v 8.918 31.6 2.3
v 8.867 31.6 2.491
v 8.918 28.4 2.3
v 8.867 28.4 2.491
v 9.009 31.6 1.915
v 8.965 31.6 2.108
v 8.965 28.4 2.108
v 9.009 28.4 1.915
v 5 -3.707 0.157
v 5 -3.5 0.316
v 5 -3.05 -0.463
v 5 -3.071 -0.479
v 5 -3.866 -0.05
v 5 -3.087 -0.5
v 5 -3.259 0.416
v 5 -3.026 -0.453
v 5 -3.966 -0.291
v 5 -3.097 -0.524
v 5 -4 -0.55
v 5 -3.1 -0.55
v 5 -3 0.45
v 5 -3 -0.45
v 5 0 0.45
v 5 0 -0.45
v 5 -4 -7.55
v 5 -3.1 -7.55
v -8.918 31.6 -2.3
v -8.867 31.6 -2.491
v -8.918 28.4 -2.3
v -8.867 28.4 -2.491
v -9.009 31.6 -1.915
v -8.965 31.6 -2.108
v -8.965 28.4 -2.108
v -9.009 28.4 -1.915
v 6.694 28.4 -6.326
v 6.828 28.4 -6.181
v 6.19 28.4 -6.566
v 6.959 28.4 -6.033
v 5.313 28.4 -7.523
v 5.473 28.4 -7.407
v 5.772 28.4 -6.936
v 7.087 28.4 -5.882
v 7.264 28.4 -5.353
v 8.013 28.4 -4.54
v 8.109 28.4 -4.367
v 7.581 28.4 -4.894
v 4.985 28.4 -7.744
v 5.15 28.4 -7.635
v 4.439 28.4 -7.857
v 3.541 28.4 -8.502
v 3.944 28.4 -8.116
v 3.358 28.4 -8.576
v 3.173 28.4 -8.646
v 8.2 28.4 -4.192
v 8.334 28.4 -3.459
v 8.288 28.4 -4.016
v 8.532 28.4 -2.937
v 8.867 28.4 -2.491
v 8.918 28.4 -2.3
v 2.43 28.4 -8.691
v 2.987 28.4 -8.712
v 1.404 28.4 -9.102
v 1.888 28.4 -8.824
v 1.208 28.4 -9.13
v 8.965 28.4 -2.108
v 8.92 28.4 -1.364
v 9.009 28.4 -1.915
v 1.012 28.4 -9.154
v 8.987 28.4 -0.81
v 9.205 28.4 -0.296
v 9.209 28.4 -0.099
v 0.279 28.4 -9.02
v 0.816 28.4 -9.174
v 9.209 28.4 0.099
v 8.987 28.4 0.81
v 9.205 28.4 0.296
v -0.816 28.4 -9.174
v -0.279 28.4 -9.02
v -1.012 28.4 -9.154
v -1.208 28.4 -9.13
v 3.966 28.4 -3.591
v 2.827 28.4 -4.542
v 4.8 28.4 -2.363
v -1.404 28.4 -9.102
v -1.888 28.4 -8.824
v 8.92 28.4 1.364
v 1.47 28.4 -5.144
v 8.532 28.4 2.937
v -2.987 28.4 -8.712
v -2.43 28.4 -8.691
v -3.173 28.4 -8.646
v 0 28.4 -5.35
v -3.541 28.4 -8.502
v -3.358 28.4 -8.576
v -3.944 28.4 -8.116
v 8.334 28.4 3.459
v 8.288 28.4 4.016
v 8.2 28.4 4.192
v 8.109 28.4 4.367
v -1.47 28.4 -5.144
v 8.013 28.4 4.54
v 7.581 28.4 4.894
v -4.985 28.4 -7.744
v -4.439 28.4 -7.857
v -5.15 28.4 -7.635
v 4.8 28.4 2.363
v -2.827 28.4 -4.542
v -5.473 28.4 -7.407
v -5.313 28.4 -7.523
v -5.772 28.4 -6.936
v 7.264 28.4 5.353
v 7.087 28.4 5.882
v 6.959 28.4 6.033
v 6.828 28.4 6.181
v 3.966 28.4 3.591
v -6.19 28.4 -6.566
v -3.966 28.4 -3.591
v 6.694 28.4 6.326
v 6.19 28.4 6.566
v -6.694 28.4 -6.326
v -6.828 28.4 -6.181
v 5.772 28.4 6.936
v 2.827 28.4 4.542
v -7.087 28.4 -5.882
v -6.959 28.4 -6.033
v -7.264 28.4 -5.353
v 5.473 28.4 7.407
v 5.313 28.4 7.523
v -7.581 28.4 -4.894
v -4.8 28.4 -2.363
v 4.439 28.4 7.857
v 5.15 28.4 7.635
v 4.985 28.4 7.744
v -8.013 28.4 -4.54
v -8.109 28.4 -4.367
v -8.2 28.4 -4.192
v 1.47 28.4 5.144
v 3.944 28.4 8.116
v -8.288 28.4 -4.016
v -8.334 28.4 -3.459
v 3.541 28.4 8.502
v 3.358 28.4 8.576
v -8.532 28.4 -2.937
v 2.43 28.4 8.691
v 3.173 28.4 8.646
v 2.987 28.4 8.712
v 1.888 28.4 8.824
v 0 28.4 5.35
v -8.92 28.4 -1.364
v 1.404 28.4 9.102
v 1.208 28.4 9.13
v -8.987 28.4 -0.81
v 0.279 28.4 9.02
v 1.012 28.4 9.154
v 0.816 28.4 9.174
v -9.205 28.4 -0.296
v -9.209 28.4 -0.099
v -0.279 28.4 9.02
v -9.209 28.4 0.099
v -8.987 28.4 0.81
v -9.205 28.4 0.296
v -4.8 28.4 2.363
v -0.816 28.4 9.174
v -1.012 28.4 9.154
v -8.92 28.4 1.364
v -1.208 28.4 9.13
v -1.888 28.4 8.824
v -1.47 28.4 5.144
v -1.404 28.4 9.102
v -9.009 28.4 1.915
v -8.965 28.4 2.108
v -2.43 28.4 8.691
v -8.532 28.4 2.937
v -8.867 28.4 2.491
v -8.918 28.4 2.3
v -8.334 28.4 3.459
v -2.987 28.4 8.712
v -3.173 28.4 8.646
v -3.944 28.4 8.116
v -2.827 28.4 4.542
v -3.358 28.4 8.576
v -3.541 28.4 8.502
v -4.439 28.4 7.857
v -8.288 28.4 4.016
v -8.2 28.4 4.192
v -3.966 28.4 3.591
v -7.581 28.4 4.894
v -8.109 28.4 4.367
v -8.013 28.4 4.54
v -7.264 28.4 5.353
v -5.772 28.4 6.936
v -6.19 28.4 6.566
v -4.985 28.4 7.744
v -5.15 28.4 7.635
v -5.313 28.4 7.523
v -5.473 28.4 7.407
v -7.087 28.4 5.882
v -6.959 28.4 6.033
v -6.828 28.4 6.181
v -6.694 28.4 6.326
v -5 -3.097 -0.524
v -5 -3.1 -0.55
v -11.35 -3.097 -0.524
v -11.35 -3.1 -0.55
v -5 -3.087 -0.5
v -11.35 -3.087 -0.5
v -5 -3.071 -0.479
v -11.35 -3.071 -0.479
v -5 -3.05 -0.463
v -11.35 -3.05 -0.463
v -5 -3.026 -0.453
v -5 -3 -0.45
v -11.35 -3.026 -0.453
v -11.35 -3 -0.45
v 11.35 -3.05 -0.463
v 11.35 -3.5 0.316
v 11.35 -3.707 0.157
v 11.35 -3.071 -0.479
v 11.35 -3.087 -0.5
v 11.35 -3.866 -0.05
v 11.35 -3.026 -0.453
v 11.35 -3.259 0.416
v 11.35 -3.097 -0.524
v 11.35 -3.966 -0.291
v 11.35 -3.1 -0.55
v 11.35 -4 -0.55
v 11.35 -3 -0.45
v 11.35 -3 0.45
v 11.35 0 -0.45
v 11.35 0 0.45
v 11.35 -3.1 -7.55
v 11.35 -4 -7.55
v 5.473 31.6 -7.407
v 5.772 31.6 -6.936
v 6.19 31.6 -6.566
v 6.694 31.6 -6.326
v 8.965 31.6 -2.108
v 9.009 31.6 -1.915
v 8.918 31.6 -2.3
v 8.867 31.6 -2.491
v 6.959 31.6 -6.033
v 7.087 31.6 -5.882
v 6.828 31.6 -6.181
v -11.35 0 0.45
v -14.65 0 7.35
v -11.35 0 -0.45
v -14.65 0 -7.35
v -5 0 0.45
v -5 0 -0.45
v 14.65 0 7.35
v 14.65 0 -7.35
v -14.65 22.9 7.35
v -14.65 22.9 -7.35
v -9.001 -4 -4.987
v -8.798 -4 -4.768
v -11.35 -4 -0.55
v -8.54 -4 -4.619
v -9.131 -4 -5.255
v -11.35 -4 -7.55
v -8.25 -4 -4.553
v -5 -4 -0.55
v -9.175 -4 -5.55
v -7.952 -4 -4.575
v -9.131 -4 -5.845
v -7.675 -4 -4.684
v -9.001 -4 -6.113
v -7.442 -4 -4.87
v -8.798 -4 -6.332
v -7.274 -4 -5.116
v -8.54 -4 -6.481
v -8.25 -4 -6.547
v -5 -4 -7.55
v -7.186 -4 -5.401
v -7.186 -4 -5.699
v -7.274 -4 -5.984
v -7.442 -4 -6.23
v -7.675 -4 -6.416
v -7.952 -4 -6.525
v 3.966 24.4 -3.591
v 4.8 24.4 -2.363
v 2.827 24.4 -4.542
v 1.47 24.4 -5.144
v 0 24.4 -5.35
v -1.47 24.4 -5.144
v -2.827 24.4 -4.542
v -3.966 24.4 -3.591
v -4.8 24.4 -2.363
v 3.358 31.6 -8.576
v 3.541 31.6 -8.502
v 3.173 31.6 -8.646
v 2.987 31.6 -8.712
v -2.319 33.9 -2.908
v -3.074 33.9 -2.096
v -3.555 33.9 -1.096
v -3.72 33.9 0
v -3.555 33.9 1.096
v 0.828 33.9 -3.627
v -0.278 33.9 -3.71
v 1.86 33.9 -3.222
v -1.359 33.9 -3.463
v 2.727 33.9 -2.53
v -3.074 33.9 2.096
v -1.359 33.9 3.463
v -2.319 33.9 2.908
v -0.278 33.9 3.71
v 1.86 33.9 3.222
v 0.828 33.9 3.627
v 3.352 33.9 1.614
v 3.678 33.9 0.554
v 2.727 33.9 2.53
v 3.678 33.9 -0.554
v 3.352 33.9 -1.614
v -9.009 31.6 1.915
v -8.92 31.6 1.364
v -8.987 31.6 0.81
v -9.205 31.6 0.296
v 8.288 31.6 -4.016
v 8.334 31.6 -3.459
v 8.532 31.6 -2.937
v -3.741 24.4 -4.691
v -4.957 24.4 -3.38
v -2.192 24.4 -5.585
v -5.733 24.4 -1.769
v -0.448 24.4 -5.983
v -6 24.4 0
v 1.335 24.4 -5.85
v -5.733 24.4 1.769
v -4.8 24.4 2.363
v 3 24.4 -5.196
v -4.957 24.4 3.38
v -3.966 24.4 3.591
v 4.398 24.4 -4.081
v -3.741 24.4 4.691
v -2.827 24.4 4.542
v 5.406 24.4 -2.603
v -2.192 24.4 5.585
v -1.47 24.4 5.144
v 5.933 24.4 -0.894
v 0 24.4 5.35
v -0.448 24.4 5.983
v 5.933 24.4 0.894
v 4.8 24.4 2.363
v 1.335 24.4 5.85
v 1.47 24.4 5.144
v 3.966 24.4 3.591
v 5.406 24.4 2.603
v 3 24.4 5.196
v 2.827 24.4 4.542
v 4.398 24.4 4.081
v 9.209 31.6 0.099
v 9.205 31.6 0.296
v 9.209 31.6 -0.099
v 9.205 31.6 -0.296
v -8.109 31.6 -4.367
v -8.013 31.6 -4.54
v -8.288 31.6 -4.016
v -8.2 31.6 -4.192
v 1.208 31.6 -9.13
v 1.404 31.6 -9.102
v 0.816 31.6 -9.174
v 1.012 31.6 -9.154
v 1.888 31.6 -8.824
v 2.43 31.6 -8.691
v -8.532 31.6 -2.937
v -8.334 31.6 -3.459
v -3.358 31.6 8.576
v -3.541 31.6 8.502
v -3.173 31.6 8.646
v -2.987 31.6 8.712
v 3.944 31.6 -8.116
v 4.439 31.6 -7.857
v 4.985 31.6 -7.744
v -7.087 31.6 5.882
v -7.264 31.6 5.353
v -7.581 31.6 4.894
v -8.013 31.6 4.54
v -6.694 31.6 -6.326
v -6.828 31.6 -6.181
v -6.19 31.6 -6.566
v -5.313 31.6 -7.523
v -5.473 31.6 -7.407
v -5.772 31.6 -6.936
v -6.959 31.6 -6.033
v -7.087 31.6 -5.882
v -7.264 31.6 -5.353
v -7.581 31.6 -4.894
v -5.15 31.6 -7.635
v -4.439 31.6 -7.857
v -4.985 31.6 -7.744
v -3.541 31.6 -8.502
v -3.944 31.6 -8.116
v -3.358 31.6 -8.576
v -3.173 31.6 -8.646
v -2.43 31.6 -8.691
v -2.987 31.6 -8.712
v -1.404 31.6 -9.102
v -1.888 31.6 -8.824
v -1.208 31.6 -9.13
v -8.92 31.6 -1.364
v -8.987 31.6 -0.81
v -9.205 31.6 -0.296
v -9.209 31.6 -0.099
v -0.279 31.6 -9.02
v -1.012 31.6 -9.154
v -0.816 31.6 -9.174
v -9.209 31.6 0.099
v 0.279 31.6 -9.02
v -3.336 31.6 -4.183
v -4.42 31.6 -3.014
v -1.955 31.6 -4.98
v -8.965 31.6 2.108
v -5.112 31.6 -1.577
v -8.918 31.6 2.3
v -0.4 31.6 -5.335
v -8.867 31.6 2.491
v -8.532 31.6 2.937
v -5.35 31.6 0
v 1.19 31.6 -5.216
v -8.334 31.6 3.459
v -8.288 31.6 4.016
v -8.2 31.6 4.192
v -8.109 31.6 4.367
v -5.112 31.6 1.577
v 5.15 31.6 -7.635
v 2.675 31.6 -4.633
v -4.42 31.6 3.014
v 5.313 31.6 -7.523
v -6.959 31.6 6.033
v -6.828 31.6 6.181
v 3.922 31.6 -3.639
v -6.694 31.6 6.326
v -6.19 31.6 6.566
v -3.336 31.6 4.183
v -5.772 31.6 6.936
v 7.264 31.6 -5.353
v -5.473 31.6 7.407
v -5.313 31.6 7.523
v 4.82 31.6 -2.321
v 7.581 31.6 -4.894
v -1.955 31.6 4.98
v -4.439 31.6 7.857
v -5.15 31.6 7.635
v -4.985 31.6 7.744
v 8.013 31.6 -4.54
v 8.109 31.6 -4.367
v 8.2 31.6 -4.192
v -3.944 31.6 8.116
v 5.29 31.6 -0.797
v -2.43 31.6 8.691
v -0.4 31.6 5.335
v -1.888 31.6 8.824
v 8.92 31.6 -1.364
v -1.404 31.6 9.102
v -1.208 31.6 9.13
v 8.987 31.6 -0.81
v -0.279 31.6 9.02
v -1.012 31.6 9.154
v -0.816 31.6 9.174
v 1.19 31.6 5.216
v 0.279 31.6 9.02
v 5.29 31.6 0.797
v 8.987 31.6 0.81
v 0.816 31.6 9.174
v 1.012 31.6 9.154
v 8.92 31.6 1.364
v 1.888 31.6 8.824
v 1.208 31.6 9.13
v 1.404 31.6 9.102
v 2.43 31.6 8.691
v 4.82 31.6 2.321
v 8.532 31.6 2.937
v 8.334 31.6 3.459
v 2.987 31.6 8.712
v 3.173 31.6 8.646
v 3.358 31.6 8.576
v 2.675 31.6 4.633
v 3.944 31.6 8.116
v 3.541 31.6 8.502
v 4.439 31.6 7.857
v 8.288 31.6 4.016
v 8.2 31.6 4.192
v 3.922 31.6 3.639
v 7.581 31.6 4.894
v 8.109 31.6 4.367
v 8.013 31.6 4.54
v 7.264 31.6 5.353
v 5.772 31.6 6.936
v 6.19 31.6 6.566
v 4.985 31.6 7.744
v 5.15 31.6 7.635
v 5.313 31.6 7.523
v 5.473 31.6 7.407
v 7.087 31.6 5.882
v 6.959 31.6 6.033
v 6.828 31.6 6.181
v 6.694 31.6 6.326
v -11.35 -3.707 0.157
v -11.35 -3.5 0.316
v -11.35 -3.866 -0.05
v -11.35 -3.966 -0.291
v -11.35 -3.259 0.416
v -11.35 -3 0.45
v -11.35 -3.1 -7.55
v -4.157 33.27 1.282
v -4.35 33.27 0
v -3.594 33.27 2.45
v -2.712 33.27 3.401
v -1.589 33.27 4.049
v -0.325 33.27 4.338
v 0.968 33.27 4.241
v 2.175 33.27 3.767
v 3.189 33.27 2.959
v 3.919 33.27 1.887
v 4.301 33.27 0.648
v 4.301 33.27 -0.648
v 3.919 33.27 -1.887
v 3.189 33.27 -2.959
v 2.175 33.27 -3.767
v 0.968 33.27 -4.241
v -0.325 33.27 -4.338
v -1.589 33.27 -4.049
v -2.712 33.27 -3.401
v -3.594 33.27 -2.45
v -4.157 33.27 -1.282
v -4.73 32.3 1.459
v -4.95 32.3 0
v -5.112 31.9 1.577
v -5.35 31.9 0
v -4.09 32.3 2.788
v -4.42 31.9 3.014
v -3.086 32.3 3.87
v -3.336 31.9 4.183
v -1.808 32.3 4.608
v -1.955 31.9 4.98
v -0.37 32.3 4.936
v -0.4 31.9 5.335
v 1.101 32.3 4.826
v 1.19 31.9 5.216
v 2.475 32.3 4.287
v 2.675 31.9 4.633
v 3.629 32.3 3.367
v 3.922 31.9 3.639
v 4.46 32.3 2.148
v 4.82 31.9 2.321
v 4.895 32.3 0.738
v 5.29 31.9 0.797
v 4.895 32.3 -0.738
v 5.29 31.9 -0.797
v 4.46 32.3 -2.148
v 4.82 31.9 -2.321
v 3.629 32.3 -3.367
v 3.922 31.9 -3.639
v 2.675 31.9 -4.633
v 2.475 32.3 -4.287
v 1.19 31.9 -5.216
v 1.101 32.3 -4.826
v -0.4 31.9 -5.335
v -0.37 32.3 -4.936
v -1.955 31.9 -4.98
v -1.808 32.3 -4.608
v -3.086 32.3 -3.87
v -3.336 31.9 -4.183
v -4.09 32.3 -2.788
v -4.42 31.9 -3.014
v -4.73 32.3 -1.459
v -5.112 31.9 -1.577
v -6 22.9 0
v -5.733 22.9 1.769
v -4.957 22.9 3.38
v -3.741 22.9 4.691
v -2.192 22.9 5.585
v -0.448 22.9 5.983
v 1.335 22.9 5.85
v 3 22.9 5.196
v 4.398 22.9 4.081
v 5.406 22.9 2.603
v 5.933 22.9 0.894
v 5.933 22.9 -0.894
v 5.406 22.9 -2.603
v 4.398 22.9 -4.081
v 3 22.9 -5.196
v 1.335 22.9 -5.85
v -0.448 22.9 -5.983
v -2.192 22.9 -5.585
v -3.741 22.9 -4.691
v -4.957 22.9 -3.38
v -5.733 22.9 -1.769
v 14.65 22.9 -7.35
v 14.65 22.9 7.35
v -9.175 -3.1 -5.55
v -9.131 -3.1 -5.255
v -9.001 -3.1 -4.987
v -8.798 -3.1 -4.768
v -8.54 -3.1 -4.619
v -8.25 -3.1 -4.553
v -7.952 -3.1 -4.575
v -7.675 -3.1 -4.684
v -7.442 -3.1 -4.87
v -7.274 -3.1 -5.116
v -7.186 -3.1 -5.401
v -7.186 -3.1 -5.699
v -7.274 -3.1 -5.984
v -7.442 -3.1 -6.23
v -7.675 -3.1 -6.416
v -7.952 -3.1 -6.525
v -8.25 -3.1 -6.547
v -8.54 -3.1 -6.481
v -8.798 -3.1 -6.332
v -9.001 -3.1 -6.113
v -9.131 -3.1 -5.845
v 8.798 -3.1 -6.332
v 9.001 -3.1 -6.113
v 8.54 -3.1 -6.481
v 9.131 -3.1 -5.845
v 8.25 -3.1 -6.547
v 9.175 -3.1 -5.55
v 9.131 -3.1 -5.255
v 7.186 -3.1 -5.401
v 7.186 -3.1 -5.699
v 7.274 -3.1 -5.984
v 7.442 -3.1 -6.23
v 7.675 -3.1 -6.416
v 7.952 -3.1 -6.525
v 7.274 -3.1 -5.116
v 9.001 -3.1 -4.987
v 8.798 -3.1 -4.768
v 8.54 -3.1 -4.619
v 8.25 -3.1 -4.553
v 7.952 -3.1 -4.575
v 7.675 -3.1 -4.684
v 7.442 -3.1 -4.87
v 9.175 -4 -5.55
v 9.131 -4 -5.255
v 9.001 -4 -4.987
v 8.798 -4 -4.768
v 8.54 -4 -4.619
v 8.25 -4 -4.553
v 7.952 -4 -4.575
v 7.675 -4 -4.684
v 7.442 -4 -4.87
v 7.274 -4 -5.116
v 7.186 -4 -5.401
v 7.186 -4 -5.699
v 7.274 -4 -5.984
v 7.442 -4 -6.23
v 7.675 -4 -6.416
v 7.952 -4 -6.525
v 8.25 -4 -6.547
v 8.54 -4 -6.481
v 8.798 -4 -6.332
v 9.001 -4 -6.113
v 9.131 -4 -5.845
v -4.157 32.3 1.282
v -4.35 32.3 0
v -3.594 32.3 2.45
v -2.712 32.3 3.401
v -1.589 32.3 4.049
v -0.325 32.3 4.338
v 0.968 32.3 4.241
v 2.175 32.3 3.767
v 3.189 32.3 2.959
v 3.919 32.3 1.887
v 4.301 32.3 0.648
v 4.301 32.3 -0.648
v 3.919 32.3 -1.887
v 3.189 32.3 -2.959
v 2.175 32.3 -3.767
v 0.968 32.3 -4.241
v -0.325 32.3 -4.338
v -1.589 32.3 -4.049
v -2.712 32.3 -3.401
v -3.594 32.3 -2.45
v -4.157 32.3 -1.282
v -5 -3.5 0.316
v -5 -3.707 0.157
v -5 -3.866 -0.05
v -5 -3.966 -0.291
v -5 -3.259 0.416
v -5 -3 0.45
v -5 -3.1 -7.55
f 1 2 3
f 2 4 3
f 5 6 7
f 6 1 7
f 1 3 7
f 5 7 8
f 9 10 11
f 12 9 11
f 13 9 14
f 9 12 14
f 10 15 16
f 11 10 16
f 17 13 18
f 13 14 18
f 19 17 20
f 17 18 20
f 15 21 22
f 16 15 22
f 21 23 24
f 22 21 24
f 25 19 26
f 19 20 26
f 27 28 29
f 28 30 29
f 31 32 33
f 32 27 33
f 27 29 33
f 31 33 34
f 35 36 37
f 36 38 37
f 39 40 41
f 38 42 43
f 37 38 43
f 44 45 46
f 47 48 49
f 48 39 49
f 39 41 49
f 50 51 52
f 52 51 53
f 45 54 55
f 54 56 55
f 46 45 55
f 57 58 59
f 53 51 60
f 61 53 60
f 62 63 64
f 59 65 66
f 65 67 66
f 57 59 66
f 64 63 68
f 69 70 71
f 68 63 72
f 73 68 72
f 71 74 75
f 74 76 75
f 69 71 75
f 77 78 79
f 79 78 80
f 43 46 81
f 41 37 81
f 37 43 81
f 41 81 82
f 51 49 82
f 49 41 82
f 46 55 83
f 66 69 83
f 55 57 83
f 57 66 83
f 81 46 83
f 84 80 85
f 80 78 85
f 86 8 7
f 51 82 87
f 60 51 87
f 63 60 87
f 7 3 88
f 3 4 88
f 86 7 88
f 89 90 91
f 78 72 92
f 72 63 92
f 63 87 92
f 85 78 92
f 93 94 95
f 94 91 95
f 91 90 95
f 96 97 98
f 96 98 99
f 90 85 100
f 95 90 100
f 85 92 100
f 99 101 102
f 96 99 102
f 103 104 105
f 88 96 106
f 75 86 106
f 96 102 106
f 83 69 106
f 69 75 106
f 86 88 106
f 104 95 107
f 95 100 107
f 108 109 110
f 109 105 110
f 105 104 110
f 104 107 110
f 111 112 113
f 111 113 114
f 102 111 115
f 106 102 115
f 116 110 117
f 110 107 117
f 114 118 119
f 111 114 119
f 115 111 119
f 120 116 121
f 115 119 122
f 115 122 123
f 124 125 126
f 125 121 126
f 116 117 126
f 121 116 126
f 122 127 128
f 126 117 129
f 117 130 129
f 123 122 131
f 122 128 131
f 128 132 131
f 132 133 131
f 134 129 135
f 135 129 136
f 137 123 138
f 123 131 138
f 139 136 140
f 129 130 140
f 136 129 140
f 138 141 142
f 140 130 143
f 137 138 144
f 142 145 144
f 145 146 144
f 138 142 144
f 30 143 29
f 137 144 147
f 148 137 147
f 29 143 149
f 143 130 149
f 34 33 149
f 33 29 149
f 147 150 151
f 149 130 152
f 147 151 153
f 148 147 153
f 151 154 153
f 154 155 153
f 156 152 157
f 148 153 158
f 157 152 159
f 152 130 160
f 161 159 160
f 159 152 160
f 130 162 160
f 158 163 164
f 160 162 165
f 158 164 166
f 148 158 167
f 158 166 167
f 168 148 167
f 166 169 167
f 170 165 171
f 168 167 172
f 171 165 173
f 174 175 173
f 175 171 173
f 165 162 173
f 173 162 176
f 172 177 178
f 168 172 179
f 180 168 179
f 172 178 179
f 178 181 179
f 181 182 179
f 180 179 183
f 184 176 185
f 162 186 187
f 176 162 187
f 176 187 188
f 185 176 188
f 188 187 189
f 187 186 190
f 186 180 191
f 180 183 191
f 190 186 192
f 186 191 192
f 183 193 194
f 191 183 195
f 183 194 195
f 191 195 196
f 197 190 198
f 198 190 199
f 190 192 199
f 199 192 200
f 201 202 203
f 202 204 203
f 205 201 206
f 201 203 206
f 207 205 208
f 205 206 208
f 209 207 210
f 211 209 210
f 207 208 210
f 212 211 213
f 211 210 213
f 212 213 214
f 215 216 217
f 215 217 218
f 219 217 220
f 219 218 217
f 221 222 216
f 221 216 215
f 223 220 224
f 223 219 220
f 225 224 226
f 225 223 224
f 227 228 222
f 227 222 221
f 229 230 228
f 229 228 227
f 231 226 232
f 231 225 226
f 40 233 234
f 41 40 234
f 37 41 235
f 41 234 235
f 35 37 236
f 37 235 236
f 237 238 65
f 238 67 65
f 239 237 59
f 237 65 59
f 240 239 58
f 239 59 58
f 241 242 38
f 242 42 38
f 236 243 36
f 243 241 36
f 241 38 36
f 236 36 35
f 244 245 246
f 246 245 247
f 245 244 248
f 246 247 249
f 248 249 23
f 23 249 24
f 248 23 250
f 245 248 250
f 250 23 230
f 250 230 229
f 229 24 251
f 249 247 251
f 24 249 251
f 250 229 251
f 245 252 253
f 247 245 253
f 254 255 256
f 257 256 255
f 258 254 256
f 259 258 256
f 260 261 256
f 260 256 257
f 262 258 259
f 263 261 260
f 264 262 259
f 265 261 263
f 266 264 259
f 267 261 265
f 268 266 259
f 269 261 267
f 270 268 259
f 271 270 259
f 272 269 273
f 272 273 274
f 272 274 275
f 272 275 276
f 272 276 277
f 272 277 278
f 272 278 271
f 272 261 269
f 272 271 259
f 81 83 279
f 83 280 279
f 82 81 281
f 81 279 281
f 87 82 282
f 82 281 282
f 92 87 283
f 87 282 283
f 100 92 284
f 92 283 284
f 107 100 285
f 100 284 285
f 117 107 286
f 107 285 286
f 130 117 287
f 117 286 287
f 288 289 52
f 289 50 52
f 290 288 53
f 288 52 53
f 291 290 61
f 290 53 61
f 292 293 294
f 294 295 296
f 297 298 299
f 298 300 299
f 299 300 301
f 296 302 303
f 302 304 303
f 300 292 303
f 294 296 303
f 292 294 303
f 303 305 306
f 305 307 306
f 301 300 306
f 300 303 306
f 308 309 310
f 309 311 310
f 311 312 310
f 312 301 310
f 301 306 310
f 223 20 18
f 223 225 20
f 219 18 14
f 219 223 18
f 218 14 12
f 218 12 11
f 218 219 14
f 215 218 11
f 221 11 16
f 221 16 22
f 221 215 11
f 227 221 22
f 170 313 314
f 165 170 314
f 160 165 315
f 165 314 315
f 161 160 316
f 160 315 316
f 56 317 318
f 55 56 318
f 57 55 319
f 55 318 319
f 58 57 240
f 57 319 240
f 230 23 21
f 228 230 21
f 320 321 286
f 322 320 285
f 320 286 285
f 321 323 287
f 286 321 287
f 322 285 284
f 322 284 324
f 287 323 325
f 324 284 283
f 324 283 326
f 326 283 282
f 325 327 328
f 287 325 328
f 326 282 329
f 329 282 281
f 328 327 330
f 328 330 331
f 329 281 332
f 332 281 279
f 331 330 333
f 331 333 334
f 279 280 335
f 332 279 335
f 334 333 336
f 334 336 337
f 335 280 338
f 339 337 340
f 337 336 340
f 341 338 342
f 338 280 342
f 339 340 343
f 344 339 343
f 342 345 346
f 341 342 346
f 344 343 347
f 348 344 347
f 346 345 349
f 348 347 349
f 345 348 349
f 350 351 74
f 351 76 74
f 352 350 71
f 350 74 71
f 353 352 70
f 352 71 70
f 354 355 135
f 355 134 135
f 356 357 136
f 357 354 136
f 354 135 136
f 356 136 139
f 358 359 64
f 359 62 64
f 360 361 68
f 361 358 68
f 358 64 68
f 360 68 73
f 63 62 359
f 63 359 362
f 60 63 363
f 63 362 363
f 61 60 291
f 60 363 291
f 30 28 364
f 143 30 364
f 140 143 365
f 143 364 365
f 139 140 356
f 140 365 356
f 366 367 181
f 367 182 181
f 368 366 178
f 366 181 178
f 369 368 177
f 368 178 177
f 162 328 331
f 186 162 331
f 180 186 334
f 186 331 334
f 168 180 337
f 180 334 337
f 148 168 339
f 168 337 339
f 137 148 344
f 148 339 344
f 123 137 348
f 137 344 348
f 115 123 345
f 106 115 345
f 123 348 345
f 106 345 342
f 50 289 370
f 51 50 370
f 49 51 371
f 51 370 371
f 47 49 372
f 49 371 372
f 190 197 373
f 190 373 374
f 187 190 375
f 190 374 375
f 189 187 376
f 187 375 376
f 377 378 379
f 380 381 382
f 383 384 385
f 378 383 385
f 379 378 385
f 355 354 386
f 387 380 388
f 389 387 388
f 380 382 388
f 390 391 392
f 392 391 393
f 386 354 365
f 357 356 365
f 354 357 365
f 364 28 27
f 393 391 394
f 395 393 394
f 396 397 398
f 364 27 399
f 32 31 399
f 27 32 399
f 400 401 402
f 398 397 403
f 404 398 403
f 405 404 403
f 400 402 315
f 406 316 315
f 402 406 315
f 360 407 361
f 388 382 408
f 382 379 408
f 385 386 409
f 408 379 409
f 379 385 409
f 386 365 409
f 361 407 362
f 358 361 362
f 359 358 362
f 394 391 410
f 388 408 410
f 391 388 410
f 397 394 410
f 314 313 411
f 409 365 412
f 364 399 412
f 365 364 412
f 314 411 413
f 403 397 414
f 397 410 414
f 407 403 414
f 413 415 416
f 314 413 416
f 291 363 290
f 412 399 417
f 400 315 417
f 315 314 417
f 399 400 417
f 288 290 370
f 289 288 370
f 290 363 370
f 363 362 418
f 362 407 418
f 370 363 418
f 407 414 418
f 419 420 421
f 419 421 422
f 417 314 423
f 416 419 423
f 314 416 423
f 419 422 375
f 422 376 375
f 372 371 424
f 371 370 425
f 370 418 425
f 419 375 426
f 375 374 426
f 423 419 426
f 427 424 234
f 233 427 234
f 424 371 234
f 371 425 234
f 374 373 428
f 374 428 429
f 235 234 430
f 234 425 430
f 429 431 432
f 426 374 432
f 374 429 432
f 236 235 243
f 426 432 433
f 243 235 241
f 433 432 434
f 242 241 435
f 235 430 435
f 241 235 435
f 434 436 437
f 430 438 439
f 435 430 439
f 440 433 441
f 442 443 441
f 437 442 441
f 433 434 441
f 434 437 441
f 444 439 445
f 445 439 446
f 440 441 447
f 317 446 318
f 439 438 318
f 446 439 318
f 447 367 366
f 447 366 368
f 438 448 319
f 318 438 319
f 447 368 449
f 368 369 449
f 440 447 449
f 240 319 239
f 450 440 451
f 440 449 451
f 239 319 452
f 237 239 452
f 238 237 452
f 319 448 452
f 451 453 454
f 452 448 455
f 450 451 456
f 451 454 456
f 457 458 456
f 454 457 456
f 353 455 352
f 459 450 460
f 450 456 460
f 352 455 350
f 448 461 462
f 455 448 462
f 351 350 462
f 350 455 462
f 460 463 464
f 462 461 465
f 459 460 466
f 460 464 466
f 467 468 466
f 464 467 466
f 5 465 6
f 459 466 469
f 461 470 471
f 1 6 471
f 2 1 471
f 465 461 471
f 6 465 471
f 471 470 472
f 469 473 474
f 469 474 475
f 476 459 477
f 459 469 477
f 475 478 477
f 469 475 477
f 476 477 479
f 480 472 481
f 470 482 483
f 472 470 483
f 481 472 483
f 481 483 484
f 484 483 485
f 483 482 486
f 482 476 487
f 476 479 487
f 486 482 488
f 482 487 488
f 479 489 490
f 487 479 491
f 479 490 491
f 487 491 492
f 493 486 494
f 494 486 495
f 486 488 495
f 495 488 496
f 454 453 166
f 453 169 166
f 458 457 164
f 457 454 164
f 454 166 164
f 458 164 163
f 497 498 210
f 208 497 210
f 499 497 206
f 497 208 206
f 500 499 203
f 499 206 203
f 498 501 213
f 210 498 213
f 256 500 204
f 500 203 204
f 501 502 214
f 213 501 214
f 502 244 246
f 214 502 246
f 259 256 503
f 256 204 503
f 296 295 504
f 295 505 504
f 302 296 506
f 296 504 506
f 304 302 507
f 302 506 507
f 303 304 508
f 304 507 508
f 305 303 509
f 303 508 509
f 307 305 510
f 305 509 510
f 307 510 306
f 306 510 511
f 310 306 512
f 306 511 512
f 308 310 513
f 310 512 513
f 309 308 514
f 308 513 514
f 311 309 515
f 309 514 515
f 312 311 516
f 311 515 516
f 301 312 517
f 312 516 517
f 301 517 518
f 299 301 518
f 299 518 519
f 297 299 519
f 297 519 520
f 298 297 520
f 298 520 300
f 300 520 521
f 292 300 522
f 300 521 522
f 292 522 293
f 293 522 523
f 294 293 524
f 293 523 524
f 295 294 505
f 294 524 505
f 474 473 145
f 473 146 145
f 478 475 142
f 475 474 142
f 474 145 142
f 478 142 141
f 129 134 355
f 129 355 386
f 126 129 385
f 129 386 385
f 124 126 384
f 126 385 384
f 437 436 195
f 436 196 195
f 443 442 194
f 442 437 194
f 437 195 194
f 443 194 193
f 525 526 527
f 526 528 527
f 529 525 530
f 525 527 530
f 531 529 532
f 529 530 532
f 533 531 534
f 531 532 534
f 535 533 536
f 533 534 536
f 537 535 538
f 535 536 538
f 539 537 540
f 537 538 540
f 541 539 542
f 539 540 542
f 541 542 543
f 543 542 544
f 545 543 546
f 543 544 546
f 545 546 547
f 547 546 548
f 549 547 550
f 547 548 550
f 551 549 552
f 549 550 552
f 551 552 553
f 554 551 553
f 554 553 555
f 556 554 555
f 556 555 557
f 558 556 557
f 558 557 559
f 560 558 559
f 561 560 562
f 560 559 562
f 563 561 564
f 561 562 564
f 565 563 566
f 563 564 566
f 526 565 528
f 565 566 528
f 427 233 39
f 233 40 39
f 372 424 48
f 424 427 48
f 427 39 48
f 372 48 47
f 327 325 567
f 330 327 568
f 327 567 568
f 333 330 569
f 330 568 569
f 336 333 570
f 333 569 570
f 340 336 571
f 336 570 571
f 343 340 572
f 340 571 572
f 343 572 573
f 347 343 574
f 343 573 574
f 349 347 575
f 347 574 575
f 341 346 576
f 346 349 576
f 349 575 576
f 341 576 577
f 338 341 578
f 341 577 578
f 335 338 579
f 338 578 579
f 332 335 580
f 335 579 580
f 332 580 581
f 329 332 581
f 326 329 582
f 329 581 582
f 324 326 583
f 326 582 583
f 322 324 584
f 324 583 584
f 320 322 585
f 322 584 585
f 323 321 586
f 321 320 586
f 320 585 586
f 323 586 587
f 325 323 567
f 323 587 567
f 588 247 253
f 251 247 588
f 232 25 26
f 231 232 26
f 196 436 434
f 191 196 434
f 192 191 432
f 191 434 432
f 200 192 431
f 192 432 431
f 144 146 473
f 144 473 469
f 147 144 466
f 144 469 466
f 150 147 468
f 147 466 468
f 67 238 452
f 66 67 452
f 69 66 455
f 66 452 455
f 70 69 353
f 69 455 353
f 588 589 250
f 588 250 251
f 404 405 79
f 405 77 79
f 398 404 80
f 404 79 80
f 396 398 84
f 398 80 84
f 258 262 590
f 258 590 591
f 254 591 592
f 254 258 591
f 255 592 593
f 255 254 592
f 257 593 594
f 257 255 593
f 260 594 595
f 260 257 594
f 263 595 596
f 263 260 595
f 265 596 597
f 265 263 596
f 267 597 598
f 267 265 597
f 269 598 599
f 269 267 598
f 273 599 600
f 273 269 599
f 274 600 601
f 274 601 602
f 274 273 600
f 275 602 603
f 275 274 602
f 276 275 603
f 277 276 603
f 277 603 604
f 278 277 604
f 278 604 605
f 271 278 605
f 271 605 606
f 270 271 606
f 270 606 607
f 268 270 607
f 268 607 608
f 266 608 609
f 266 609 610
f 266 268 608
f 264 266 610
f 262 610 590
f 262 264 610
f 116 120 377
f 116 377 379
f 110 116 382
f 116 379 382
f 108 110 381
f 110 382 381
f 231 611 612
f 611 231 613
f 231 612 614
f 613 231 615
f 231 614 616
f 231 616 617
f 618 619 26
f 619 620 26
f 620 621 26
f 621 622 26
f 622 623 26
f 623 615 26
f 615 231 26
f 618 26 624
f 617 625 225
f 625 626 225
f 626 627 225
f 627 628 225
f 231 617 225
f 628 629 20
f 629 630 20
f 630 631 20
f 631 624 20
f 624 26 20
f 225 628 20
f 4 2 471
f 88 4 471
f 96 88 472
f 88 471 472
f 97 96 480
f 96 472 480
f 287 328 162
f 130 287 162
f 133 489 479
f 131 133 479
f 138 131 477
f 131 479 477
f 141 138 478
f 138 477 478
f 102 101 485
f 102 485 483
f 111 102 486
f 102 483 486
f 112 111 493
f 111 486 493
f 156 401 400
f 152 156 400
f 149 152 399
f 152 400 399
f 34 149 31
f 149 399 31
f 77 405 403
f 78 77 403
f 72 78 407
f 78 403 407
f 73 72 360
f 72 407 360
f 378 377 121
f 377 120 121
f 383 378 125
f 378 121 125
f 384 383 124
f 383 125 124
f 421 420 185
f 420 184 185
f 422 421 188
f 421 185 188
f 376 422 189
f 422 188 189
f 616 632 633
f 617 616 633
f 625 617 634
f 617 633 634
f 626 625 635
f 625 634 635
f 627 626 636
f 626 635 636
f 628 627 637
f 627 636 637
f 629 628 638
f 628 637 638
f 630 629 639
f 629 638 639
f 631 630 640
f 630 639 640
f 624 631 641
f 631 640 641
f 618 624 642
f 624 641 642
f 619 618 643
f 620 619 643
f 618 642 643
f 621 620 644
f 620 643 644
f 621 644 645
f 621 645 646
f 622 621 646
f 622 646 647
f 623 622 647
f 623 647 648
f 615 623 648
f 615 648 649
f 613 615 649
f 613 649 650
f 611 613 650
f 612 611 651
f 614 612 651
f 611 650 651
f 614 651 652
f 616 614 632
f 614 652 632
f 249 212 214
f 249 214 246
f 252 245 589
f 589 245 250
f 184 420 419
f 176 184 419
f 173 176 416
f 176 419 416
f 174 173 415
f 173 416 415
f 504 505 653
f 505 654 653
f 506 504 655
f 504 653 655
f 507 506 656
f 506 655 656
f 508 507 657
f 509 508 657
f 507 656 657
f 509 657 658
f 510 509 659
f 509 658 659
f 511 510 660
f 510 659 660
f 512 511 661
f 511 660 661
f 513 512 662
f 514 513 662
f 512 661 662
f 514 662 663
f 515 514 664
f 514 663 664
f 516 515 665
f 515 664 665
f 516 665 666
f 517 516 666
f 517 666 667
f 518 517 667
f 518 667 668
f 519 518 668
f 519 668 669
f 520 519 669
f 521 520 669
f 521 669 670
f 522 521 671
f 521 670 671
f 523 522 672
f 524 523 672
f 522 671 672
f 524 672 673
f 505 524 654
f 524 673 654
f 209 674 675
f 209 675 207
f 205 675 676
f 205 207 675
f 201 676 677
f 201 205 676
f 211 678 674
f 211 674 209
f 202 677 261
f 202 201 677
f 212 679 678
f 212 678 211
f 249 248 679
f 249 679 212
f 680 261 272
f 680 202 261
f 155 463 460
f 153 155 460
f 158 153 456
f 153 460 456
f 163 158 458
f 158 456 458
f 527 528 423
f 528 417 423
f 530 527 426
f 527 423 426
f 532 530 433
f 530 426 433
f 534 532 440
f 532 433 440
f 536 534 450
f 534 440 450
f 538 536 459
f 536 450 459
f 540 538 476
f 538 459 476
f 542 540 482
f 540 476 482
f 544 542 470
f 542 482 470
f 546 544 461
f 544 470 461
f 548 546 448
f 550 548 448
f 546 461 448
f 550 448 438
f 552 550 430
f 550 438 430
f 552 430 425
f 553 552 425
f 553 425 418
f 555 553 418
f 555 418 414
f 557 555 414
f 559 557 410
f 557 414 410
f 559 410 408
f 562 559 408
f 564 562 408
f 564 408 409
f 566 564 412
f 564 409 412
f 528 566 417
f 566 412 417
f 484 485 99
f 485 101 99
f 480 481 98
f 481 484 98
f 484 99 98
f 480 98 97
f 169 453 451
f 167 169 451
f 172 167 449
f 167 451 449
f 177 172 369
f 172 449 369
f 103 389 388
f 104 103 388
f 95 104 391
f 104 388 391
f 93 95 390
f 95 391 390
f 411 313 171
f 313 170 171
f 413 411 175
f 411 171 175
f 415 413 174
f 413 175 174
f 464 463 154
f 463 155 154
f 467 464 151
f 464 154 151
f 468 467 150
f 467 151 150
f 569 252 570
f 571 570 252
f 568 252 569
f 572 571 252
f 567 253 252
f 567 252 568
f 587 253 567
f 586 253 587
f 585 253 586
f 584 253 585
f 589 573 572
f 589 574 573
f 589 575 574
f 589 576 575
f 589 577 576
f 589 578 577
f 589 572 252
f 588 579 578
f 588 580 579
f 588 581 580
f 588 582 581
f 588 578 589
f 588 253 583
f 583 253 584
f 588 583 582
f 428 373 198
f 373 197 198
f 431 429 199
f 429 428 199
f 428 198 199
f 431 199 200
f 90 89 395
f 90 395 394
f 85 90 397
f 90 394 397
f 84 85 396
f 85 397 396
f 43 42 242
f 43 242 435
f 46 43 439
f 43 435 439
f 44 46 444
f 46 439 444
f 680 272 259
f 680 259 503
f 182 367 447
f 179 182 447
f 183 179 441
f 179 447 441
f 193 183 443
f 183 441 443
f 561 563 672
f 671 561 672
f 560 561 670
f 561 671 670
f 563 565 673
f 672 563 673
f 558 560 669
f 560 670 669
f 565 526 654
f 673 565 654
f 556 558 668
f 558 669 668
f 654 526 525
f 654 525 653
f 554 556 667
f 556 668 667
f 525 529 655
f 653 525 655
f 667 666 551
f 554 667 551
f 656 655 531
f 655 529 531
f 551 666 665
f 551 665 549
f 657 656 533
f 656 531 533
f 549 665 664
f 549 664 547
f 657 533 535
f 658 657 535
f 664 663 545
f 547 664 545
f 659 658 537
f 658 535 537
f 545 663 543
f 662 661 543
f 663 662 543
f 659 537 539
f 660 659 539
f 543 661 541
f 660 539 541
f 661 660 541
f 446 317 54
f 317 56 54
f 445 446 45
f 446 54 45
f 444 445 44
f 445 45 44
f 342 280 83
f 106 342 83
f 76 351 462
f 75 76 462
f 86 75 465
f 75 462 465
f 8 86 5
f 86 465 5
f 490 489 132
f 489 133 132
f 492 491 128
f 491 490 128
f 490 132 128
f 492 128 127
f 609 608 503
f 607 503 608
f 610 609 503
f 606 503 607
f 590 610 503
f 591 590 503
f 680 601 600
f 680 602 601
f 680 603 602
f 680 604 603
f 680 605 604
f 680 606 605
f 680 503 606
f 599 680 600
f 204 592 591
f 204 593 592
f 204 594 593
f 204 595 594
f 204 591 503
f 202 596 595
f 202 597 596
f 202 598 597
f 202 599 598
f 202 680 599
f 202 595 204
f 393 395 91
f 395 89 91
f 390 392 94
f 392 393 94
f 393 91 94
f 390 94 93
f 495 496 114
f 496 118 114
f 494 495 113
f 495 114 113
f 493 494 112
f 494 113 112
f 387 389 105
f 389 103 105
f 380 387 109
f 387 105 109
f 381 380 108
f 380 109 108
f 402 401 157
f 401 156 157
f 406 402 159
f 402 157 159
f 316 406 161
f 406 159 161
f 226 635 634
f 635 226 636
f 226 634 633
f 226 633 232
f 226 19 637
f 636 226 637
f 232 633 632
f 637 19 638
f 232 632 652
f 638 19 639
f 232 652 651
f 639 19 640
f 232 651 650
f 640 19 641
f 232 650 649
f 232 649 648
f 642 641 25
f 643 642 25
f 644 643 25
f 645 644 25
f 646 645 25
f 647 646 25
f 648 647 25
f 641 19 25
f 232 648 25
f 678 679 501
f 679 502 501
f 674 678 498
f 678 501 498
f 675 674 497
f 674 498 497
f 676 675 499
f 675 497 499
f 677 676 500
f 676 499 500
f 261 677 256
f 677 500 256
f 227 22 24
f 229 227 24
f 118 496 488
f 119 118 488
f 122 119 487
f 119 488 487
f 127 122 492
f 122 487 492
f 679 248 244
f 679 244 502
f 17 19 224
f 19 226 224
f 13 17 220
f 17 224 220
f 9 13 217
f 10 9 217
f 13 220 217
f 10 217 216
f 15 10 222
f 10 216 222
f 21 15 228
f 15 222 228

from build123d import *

# Parameters (mm, degrees)
SKETCH2_W           = 29.3
SKETCH2_H           = 14.7
BOSS_EXTRUDE1_DEPTH = 22.9
BOSS_EXTRUDE2_START = 5
BOSS_EXTRUDE2_DEPTH = 6.35
SKETCH8_R           = 1
CUT_EXTRUDE3_DEPTH  = 0.9
SKETCH5_R           = 2
CUT_EXTRUDE1_DEPTH  = 3.2
CIRPATTERN1_COUNT   = 26
SKETCH7_W           = 0.55
SKETCH7_H           = 4
CUT_EXTRUDE2_DEPTH  = 17.523822727
FILLET1_R           = 0.1
FILLET1_2_R         = 1


with BuildPart() as part:
    # Sketch2 → Boss-Extrude1 (new body)
    with BuildSketch(Plane(origin=(0, 0, 0), x_dir=(1, 0, 0), z_dir=(0, 1, 0))):
        Rectangle(SKETCH2_W, SKETCH2_H)
    extrude(amount=BOSS_EXTRUDE1_DEPTH)

    # Sketch3 → Revolve1 (revolve)
    with BuildSketch(Plane.XY):
        Polygon((0, 22.9), (0, 33.9), (-3.72, 33.9), (-4.35, 33.27), (-4.35, 32.3), (-4.95, 32.3), (-5.35, 31.9), (-5.35, 31.6), (-9.21, 31.6), (-9.21, 28.4), (-5.35, 28.4), (-5.35, 24.4), (-6, 24.4), (-6, 22.9), align=None)
    revolve(axis=Axis((0, 22.9, 0), (0, 1, 0)))

    # Sketch4 → Boss-Extrude2 (add)
    with BuildSketch(Plane(origin=(0, 0, 0), x_dir=(0, 0, -1), z_dir=(1, 0, 0)).offset(BOSS_EXTRUDE2_START)):
        Polygon((-0.45, -4), (0.45, -4), (7.55, -4), (7.55, -3.1), (0.45, -3.1), (0.45, 0), (-0.45, 0), align=None)
    boss_extrude2 = extrude(amount=BOSS_EXTRUDE2_DEPTH)

    # Sketch8 → Cut-Extrude3 (cut)
    with BuildSketch(Plane.XZ.offset(4)):
        with Locations((8.175, -5.55)):
            Circle(SKETCH8_R)
    cut_extrude3 = extrude(amount=-CUT_EXTRUDE3_DEPTH, mode=Mode.SUBTRACT)

    # Mirror1: Boss-Extrude2, Cut-Extrude3 across plane
    add(boss_extrude2.mirror(Plane(origin=(0, 0, 0), x_dir=(0, 0, 1), z_dir=(1, 0, 0))))
    add(cut_extrude3.mirror(Plane(origin=(0, 0, 0), x_dir=(0, 0, 1), z_dir=(1, 0, 0))), mode=Mode.SUBTRACT)

    # Sketch5 → Cut-Extrude1 (cut)
    with BuildSketch(Plane(origin=(0, 31.6, 0), x_dir=(1, 0, 0), z_dir=(0, 1, 0))):
        with Locations((0, 11)):
            Circle(SKETCH5_R)
    cut_extrude1 = extrude(amount=-CUT_EXTRUDE1_DEPTH, mode=Mode.SUBTRACT)

    # CirPattern1: Cut-Extrude1 ×26 about axis
    cirpattern1_axis = Axis((0, 0, 0), (0, 1, 0))
    for i in range(1, CIRPATTERN1_COUNT):
        add(cut_extrude1.rotate(cirpattern1_axis, i * 360 / CIRPATTERN1_COUNT), mode=Mode.SUBTRACT)

    # Sketch7 → Cut-Extrude2 (cut, through all)
    with BuildSketch(Plane.XY.offset(7.35)):
        with Locations((5.075, 26.4)):
            Rectangle(SKETCH7_W, SKETCH7_H)
        with Locations((-5.075, 26.4)):
            Rectangle(SKETCH7_W, SKETCH7_H)
    extrude(amount=-CUT_EXTRUDE2_DEPTH, mode=Mode.SUBTRACT)

    # Fillet1
    fillet1_edges = [part.edges().sort_by_distance(p)[0] for p in [
        (8.175, -3.1, -0.45),
        (-8.175, -3.1, -0.45),
    ]]
    fillet(fillet1_edges, radius=FILLET1_R)

    # Fillet1 2
    fillet1_2_edges = [part.edges().sort_by_distance(p)[0] for p in [
        (8.175, -4, 0.45),
        (-8.175, -4, 0.45),
    ]]
    fillet(fillet1_2_edges, radius=FILLET1_2_R)


solid = part.part
